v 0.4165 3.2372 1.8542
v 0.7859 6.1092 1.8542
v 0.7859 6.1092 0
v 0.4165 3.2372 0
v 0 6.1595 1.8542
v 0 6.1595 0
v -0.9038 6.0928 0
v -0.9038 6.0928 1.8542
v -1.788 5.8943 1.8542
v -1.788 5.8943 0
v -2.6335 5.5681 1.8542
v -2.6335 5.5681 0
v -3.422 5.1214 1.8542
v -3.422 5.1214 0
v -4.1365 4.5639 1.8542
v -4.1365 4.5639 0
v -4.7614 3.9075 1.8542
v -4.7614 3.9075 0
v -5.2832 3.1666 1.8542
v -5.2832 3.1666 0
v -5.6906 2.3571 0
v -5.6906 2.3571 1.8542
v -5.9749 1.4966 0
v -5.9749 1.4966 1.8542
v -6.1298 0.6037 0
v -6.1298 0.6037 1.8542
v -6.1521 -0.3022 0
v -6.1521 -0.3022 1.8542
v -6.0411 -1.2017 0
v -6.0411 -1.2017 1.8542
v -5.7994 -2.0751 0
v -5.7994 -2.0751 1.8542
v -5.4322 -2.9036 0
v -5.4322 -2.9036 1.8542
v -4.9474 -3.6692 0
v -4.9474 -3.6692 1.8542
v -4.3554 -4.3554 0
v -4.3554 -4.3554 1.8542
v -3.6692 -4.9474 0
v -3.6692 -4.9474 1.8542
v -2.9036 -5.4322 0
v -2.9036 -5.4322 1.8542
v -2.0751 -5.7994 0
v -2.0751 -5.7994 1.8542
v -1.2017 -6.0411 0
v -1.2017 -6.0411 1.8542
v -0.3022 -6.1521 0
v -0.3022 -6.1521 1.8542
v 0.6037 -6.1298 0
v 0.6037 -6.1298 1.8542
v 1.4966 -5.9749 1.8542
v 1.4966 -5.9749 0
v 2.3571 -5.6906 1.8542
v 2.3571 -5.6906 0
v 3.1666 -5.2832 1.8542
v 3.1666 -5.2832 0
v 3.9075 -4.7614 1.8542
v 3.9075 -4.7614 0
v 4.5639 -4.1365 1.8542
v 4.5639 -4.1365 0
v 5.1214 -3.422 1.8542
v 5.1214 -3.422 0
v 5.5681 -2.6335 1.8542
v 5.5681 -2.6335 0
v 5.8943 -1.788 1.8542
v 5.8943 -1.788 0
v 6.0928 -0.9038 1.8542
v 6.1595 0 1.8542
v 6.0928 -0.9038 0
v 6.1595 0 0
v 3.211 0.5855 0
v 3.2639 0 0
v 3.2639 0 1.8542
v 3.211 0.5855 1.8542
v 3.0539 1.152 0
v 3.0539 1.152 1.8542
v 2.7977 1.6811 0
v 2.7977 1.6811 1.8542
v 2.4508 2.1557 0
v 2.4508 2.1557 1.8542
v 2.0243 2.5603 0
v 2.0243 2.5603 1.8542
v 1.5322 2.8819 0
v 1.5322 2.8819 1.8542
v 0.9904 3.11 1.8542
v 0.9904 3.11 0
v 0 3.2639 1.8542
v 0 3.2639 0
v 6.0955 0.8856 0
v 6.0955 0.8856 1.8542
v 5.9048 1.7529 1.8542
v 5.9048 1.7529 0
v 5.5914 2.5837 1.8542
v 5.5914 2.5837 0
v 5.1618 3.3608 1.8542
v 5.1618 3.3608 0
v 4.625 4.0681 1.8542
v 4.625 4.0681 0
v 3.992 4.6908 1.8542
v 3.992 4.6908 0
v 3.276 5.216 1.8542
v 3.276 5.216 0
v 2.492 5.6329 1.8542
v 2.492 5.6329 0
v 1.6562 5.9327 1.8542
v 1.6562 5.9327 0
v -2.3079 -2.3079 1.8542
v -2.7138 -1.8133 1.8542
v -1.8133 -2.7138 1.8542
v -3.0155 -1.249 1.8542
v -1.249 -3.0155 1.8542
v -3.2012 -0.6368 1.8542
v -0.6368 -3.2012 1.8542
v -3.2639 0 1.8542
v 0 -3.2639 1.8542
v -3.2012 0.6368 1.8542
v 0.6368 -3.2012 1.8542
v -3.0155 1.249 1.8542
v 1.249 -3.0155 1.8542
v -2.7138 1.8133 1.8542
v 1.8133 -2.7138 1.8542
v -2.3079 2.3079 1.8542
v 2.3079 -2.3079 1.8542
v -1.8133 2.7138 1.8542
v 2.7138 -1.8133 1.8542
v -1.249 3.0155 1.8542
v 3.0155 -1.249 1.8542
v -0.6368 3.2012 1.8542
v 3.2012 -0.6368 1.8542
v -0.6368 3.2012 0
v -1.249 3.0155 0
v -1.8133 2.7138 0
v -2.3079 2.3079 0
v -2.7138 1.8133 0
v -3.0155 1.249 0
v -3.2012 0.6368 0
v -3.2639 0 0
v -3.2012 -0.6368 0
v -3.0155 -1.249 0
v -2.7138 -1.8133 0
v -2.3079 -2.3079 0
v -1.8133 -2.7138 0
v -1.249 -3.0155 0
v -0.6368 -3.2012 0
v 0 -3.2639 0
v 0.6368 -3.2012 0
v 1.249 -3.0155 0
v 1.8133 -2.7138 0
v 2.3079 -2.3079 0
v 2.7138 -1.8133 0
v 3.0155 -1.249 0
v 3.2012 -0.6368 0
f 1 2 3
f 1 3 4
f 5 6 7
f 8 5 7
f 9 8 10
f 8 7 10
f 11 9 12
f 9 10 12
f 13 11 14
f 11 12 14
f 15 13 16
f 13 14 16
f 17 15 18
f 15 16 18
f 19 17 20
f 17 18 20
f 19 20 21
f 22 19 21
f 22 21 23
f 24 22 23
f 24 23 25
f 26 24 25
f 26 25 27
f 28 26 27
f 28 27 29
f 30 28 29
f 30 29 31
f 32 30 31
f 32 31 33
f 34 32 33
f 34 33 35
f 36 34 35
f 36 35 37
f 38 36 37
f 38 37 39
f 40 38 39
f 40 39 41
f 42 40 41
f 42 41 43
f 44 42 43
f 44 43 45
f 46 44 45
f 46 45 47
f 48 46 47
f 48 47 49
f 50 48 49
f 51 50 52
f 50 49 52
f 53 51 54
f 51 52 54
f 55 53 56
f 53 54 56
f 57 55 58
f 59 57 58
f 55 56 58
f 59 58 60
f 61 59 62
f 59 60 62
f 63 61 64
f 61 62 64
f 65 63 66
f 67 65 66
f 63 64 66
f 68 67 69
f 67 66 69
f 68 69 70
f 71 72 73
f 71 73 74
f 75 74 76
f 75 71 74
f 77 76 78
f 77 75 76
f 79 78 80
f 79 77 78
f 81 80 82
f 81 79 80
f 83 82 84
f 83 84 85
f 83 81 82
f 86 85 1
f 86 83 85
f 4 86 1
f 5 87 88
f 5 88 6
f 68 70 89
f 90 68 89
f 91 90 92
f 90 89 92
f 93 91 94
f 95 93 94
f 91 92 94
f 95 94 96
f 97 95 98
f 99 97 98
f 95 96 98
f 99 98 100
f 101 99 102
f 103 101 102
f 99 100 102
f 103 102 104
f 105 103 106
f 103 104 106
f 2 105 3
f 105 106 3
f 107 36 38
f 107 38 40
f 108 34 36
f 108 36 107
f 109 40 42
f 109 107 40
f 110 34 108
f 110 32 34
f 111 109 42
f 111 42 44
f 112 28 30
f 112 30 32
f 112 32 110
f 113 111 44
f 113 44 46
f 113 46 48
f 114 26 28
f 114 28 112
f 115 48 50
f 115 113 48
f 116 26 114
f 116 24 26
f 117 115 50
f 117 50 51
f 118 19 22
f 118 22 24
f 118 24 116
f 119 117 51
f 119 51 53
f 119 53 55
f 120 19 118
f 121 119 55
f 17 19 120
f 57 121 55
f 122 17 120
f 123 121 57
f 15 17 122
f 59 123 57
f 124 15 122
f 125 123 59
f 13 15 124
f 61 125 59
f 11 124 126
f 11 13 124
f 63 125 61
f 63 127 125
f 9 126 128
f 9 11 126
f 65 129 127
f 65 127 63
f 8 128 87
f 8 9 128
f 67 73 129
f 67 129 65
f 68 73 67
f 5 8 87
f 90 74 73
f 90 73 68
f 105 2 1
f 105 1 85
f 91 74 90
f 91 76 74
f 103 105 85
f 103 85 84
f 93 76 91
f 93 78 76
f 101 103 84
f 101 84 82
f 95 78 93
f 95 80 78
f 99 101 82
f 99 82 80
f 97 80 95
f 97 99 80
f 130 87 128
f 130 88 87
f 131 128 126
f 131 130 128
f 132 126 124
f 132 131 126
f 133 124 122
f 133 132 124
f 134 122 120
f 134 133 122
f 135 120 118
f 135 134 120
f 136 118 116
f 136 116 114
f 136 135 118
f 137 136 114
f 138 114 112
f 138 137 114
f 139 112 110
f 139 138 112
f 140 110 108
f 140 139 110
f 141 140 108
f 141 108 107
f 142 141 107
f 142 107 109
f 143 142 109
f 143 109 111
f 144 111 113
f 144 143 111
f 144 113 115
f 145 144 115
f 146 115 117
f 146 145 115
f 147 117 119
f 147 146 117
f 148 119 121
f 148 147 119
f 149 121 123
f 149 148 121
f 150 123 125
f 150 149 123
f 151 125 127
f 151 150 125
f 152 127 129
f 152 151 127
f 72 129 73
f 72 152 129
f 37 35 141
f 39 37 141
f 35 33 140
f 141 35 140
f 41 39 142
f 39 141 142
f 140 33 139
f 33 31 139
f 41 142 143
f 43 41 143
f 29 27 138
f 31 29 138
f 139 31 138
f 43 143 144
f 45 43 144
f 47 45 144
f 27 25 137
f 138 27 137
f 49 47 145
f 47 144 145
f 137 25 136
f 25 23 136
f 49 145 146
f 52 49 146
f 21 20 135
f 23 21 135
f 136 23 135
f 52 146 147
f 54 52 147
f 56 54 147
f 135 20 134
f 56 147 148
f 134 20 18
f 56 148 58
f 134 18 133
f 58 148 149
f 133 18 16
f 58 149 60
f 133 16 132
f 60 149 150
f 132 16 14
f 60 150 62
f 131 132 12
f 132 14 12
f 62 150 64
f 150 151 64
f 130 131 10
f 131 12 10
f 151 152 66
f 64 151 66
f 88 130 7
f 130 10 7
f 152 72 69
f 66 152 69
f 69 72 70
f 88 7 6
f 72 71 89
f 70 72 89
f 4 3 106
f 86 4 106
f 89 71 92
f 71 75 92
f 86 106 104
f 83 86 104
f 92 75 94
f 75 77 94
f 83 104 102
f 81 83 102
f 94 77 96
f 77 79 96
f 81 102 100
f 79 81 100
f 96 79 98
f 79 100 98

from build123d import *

# Parameters (mm, degrees)
SKETCH1_R      = 6.1595
SKETCH1_R_2    = 3.2639
EXTRUDE1_DEPTH = 1.8542
EXTRUDE2_DEPTH = 1.8542


with BuildPart() as part:
    # Sketch1 → Extrude1 (new body)
    with BuildSketch(Plane.XY):
        Circle(SKETCH1_R)
        Circle(SKETCH1_R_2, mode=Mode.SUBTRACT)
    extrude(amount=EXTRUDE1_DEPTH)

    # Sketch2 → Extrude2 (cut)
    with BuildSketch(Plane.XY.offset(1.8542)):
        with BuildLine():
            Line((0, 0), (0, 6.1595))
            ThreePointArc((0, 6.1595), (0.393778969, 6.146899899), (0.785946881, 6.109151148))
            Line((0.785946881, 6.109151148), (0, 0))
        make_face()
    extrude(amount=-EXTRUDE2_DEPTH, mode=Mode.SUBTRACT)


solid = part.part
